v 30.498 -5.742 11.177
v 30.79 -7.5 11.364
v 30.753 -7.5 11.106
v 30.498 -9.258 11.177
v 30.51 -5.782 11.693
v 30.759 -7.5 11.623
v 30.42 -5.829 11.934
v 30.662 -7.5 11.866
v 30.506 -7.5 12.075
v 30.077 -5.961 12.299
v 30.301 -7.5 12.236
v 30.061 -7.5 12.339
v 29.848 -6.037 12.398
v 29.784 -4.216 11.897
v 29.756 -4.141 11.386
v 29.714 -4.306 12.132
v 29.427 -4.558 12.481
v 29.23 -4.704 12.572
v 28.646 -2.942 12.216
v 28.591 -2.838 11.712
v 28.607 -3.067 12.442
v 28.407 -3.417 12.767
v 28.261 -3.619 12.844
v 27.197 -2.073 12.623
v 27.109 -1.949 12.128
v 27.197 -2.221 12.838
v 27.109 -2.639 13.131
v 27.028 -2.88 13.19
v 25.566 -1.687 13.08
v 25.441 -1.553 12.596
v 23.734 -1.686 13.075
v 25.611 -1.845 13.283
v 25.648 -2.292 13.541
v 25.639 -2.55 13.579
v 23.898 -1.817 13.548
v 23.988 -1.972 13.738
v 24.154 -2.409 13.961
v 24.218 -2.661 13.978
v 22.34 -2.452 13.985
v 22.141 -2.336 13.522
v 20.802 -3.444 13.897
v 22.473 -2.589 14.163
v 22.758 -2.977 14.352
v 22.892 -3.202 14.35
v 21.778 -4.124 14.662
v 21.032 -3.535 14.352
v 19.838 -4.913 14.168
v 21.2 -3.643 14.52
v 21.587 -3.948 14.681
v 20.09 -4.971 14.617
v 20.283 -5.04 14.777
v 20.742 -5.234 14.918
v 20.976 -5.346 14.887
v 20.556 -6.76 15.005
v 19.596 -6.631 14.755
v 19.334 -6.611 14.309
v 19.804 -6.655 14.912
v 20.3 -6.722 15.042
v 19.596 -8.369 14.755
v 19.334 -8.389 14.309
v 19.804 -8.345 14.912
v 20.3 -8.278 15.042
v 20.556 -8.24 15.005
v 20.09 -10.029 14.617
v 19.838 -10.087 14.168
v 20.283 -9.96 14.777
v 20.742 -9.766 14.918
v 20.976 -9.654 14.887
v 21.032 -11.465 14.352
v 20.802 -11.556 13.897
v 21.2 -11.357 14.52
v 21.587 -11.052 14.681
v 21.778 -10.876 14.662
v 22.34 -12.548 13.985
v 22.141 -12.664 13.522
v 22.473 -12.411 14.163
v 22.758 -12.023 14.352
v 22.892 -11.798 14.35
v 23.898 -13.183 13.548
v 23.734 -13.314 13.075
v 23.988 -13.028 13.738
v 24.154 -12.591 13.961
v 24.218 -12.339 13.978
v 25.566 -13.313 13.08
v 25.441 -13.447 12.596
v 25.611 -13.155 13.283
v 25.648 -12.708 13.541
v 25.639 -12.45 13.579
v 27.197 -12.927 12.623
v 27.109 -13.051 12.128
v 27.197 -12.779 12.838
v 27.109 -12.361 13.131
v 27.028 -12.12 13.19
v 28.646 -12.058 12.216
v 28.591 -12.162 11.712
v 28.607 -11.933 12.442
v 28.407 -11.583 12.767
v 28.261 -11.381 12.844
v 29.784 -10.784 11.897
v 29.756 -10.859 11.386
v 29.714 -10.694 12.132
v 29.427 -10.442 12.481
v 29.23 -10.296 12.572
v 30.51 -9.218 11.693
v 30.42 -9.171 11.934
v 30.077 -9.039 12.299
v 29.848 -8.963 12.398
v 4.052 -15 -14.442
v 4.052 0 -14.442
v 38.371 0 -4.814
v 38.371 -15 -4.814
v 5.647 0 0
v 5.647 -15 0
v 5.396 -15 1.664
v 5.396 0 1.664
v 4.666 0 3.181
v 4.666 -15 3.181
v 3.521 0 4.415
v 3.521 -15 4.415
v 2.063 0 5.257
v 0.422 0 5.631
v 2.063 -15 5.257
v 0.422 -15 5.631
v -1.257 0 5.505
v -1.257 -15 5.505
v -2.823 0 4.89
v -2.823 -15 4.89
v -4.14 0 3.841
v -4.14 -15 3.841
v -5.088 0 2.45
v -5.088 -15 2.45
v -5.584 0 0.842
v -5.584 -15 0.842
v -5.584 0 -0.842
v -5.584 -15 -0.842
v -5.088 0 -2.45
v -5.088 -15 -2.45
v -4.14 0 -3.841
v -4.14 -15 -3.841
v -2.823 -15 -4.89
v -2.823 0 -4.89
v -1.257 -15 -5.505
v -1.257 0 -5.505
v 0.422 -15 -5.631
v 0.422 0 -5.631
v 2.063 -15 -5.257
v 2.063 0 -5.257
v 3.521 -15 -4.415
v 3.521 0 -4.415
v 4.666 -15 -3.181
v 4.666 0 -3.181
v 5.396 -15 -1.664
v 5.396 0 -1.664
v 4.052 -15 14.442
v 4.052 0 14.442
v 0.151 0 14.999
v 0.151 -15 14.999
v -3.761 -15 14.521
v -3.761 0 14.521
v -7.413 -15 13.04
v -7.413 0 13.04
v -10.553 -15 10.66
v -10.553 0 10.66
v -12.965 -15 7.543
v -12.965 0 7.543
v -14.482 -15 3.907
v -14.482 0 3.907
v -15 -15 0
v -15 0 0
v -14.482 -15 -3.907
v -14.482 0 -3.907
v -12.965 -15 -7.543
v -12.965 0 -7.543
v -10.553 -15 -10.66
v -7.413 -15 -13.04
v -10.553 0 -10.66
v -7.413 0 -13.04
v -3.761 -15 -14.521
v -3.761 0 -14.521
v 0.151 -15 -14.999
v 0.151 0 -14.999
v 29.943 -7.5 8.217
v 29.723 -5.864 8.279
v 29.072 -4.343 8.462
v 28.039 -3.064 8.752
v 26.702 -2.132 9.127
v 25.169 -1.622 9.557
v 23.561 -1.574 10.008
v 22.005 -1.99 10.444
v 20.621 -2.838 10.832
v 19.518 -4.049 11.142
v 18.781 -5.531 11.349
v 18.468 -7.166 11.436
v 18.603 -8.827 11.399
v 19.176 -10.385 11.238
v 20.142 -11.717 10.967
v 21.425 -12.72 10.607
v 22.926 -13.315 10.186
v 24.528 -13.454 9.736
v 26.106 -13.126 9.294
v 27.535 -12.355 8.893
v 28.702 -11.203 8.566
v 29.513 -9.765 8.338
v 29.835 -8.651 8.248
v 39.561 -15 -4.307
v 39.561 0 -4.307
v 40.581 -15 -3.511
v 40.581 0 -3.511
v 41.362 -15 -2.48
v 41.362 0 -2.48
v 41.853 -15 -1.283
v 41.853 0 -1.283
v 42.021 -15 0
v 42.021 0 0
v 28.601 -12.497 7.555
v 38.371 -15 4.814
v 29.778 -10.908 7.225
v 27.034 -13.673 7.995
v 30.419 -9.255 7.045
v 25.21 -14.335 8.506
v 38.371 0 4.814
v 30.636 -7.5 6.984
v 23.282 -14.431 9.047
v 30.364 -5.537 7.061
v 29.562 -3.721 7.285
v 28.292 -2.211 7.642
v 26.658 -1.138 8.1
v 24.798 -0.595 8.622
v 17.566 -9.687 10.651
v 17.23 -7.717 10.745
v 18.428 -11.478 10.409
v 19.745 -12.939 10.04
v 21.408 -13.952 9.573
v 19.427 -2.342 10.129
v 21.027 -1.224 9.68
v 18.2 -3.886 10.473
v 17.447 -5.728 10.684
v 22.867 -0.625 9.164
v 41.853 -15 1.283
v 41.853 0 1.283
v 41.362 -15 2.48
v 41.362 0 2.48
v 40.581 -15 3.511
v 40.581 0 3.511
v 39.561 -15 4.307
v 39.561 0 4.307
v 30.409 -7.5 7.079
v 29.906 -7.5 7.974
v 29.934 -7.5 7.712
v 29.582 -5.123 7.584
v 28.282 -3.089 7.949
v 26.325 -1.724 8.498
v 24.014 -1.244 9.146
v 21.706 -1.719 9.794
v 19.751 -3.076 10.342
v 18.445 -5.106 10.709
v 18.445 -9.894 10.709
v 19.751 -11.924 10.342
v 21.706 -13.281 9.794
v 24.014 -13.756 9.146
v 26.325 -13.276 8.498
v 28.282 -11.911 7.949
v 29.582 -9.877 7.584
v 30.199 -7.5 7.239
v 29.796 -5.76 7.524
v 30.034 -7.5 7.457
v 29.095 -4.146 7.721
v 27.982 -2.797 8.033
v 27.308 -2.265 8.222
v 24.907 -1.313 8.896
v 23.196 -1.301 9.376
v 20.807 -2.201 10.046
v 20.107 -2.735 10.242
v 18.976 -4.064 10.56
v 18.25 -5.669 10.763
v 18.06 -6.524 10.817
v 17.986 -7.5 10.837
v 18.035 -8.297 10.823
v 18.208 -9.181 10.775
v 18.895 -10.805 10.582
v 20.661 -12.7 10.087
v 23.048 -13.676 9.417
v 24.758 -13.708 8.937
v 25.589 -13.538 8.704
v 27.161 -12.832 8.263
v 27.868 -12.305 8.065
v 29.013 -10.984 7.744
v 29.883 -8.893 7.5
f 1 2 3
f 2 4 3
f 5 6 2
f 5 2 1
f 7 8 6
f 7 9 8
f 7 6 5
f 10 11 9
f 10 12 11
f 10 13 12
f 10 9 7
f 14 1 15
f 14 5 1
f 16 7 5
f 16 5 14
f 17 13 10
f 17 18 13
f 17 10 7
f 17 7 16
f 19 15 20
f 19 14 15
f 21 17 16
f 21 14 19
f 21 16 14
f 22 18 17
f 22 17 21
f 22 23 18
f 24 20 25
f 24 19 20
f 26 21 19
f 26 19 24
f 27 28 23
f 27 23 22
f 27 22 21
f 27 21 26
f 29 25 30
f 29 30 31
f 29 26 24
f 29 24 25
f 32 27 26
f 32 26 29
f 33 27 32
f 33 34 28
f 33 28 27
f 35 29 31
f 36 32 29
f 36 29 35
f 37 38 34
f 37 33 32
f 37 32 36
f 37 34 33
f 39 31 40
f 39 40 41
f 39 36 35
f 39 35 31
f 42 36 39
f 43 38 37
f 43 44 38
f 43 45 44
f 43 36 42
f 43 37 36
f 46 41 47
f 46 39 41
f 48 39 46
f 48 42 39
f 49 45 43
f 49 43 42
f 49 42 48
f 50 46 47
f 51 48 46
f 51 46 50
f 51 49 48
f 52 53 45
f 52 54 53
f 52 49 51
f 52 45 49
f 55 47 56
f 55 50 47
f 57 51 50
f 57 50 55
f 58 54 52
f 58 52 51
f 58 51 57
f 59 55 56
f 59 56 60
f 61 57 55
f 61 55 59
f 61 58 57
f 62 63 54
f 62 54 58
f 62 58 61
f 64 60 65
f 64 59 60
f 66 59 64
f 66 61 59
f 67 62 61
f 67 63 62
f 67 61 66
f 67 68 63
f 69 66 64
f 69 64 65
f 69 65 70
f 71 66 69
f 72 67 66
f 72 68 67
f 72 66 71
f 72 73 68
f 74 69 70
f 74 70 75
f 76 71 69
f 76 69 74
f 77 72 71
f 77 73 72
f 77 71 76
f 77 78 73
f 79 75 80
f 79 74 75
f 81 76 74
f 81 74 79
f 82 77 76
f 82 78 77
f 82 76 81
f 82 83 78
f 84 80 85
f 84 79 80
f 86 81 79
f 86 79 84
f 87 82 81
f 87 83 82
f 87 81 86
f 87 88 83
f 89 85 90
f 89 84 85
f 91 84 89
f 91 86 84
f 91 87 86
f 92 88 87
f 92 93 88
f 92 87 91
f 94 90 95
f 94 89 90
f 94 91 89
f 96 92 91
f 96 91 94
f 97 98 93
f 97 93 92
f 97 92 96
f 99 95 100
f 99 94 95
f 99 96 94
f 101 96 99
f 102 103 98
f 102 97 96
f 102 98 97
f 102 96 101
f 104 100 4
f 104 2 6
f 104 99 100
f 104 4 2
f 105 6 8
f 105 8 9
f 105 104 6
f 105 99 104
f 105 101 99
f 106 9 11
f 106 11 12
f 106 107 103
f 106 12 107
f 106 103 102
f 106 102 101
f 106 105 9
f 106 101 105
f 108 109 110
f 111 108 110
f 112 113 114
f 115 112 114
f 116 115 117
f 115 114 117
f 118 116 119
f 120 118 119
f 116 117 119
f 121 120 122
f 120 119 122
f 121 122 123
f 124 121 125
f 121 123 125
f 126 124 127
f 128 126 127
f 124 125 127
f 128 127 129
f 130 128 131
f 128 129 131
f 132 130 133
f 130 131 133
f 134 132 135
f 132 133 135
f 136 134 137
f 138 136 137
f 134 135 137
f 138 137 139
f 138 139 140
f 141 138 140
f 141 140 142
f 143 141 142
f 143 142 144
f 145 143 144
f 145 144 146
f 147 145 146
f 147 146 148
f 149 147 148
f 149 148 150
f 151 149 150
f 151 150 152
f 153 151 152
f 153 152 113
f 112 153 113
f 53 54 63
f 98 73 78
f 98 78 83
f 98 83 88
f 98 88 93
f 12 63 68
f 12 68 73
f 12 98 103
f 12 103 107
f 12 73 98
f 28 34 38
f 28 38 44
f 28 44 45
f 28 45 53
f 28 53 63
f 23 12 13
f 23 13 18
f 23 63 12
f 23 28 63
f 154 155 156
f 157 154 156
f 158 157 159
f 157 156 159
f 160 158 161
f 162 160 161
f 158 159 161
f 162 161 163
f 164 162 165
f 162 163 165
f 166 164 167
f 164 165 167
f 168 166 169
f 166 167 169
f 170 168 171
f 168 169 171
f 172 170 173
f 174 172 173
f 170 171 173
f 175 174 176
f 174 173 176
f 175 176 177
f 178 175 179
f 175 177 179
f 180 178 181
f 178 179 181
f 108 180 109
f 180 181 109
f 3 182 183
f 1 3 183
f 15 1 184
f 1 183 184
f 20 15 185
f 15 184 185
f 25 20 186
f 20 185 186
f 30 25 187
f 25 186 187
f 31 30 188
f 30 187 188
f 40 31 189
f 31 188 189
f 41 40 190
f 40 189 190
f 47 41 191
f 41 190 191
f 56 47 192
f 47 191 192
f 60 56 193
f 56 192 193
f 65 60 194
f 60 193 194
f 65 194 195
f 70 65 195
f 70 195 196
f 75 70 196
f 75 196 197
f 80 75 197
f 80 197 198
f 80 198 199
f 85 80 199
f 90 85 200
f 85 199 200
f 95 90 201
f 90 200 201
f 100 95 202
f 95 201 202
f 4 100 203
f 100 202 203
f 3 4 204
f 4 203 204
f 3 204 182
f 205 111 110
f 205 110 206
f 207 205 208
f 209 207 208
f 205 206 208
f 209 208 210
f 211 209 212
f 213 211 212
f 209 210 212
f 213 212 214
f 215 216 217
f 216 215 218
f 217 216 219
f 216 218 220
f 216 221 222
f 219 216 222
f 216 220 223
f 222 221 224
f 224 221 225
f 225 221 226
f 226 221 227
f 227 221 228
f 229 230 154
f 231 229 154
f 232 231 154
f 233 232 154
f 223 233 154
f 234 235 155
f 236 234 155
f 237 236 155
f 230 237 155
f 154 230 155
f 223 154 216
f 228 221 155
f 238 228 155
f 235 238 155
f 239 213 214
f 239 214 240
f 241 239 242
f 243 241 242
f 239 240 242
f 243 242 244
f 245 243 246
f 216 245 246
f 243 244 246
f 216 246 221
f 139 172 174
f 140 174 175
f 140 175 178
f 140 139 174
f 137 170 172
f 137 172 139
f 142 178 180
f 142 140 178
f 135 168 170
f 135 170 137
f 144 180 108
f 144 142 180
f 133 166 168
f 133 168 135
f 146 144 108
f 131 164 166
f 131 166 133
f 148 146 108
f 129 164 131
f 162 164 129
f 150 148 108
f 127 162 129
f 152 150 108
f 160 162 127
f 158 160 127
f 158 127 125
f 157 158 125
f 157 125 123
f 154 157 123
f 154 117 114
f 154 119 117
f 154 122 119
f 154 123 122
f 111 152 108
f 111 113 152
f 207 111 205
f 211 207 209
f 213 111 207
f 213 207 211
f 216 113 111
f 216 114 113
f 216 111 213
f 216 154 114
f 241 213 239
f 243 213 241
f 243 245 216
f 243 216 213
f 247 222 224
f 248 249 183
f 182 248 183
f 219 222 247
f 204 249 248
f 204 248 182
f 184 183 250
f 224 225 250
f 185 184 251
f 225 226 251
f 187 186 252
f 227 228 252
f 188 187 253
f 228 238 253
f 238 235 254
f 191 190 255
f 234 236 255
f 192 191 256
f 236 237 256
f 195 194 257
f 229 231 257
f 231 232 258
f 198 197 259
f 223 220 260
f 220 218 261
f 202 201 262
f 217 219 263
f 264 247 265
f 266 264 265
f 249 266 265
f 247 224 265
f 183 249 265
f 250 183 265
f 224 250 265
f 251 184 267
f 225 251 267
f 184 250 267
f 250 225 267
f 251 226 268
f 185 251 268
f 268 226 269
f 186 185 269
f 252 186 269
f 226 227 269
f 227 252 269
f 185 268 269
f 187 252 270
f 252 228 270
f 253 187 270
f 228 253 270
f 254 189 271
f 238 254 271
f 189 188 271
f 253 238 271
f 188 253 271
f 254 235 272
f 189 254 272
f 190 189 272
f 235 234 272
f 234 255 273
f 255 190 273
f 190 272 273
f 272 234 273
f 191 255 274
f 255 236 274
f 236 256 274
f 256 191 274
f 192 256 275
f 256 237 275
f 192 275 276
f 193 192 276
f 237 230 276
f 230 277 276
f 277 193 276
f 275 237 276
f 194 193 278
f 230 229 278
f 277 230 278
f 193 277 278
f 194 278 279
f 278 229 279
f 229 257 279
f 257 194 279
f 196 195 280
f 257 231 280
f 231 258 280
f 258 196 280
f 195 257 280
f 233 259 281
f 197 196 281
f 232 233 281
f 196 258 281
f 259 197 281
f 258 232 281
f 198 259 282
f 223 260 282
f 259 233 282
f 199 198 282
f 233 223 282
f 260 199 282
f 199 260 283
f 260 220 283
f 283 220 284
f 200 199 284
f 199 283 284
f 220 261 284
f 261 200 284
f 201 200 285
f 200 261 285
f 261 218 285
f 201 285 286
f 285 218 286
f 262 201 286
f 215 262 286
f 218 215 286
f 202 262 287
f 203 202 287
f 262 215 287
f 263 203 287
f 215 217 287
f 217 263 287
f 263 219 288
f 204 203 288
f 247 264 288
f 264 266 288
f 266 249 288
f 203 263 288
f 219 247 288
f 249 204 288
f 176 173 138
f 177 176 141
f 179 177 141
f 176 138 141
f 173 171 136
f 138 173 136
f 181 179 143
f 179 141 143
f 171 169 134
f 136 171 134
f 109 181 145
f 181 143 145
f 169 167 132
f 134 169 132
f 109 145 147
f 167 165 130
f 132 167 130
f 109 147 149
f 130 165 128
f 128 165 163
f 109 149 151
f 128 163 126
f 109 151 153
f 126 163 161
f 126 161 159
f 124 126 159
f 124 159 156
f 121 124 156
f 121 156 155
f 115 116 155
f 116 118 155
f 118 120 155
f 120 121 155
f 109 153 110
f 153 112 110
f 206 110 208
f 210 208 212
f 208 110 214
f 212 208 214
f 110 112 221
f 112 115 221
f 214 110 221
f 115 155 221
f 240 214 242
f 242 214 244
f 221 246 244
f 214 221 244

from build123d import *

# Parameters (mm, degrees)
F1_DEPTH = 15
F2_R     = 5.6469971394
F3_DEPTH = 16
F4_R     = 5.9634440704
F5_DEPTH = 5
F6_R     = 1


with BuildPart() as f1:
    # F0 (on Front) → F1 (new body)
    with BuildSketch(Plane.XZ):
        with BuildLine():
            ThreePointArc((4.051797674, -14.4424006179), (11.9535970551, -9.0615405669), (15, 0))
            ThreePointArc((15, 0), (11.9535970551, 9.0615405669), (4.051797674, 14.4424006179))
            ThreePointArc((4.051797674, 14.4424006179), (-15, 0), (4.051797674, -14.4424006179))
        make_face()
        with BuildLine():
            ThreePointArc((4.051797674, 14.4424006179), (11.9535970551, 9.0615405669), (15, 0))
            ThreePointArc((15, 0), (11.9535970551, -9.0615405669), (4.051797674, -14.4424006179))
            Line((4.051797674, -14.4424006179), (38.3712039217, -4.8141335393))
            ThreePointArc((38.3712039217, -4.8141335393), (32.0206046971, 0), (38.3712039217, 4.8141335393))
            Line((38.3712039217, 4.8141335393), (4.051797674, 14.4424006179))
        make_face()
        with BuildLine():
            ThreePointArc((42.0206046971, 0), (41.0051370488, 3.0205135223), (38.3712039217, 4.8141335393))
            ThreePointArc((38.3712039217, 4.8141335393), (32.0206046971, 0), (38.3712039217, -4.8141335393))
            ThreePointArc((38.3712039217, -4.8141335393), (41.0051370488, -3.0205135223), (42.0206046971, 0))
        make_face()
    extrude(amount=F1_DEPTH)

    # F2 (on face) → F3 (cut)
    with BuildSketch(Plane.XZ.offset(15)):
        Circle(F2_R)
    extrude(amount=-F3_DEPTH, mode=Mode.SUBTRACT)

    # F4 (on face) → F5 (join)
    with BuildSketch(Plane(origin=(4.051797674, 0, 14.4424006179), x_dir=(0.9628267079, 0, -0.2701198449), z_dir=(0.2701198449, 0, 0.9628267079))):
        with Locations((20.6467304379, -7.5)):
            Circle(F4_R)
    extrude(amount=F5_DEPTH)

    # F6
    f6_edges = [f1.edges().sort_by_distance(p)[0] for p in [
        (19.539857, -7.5, 15.290287),
        (18.189258, -7.5, 10.476154),
    ]]
    fillet(f6_edges, radius=F6_R)


solid = f1.part
